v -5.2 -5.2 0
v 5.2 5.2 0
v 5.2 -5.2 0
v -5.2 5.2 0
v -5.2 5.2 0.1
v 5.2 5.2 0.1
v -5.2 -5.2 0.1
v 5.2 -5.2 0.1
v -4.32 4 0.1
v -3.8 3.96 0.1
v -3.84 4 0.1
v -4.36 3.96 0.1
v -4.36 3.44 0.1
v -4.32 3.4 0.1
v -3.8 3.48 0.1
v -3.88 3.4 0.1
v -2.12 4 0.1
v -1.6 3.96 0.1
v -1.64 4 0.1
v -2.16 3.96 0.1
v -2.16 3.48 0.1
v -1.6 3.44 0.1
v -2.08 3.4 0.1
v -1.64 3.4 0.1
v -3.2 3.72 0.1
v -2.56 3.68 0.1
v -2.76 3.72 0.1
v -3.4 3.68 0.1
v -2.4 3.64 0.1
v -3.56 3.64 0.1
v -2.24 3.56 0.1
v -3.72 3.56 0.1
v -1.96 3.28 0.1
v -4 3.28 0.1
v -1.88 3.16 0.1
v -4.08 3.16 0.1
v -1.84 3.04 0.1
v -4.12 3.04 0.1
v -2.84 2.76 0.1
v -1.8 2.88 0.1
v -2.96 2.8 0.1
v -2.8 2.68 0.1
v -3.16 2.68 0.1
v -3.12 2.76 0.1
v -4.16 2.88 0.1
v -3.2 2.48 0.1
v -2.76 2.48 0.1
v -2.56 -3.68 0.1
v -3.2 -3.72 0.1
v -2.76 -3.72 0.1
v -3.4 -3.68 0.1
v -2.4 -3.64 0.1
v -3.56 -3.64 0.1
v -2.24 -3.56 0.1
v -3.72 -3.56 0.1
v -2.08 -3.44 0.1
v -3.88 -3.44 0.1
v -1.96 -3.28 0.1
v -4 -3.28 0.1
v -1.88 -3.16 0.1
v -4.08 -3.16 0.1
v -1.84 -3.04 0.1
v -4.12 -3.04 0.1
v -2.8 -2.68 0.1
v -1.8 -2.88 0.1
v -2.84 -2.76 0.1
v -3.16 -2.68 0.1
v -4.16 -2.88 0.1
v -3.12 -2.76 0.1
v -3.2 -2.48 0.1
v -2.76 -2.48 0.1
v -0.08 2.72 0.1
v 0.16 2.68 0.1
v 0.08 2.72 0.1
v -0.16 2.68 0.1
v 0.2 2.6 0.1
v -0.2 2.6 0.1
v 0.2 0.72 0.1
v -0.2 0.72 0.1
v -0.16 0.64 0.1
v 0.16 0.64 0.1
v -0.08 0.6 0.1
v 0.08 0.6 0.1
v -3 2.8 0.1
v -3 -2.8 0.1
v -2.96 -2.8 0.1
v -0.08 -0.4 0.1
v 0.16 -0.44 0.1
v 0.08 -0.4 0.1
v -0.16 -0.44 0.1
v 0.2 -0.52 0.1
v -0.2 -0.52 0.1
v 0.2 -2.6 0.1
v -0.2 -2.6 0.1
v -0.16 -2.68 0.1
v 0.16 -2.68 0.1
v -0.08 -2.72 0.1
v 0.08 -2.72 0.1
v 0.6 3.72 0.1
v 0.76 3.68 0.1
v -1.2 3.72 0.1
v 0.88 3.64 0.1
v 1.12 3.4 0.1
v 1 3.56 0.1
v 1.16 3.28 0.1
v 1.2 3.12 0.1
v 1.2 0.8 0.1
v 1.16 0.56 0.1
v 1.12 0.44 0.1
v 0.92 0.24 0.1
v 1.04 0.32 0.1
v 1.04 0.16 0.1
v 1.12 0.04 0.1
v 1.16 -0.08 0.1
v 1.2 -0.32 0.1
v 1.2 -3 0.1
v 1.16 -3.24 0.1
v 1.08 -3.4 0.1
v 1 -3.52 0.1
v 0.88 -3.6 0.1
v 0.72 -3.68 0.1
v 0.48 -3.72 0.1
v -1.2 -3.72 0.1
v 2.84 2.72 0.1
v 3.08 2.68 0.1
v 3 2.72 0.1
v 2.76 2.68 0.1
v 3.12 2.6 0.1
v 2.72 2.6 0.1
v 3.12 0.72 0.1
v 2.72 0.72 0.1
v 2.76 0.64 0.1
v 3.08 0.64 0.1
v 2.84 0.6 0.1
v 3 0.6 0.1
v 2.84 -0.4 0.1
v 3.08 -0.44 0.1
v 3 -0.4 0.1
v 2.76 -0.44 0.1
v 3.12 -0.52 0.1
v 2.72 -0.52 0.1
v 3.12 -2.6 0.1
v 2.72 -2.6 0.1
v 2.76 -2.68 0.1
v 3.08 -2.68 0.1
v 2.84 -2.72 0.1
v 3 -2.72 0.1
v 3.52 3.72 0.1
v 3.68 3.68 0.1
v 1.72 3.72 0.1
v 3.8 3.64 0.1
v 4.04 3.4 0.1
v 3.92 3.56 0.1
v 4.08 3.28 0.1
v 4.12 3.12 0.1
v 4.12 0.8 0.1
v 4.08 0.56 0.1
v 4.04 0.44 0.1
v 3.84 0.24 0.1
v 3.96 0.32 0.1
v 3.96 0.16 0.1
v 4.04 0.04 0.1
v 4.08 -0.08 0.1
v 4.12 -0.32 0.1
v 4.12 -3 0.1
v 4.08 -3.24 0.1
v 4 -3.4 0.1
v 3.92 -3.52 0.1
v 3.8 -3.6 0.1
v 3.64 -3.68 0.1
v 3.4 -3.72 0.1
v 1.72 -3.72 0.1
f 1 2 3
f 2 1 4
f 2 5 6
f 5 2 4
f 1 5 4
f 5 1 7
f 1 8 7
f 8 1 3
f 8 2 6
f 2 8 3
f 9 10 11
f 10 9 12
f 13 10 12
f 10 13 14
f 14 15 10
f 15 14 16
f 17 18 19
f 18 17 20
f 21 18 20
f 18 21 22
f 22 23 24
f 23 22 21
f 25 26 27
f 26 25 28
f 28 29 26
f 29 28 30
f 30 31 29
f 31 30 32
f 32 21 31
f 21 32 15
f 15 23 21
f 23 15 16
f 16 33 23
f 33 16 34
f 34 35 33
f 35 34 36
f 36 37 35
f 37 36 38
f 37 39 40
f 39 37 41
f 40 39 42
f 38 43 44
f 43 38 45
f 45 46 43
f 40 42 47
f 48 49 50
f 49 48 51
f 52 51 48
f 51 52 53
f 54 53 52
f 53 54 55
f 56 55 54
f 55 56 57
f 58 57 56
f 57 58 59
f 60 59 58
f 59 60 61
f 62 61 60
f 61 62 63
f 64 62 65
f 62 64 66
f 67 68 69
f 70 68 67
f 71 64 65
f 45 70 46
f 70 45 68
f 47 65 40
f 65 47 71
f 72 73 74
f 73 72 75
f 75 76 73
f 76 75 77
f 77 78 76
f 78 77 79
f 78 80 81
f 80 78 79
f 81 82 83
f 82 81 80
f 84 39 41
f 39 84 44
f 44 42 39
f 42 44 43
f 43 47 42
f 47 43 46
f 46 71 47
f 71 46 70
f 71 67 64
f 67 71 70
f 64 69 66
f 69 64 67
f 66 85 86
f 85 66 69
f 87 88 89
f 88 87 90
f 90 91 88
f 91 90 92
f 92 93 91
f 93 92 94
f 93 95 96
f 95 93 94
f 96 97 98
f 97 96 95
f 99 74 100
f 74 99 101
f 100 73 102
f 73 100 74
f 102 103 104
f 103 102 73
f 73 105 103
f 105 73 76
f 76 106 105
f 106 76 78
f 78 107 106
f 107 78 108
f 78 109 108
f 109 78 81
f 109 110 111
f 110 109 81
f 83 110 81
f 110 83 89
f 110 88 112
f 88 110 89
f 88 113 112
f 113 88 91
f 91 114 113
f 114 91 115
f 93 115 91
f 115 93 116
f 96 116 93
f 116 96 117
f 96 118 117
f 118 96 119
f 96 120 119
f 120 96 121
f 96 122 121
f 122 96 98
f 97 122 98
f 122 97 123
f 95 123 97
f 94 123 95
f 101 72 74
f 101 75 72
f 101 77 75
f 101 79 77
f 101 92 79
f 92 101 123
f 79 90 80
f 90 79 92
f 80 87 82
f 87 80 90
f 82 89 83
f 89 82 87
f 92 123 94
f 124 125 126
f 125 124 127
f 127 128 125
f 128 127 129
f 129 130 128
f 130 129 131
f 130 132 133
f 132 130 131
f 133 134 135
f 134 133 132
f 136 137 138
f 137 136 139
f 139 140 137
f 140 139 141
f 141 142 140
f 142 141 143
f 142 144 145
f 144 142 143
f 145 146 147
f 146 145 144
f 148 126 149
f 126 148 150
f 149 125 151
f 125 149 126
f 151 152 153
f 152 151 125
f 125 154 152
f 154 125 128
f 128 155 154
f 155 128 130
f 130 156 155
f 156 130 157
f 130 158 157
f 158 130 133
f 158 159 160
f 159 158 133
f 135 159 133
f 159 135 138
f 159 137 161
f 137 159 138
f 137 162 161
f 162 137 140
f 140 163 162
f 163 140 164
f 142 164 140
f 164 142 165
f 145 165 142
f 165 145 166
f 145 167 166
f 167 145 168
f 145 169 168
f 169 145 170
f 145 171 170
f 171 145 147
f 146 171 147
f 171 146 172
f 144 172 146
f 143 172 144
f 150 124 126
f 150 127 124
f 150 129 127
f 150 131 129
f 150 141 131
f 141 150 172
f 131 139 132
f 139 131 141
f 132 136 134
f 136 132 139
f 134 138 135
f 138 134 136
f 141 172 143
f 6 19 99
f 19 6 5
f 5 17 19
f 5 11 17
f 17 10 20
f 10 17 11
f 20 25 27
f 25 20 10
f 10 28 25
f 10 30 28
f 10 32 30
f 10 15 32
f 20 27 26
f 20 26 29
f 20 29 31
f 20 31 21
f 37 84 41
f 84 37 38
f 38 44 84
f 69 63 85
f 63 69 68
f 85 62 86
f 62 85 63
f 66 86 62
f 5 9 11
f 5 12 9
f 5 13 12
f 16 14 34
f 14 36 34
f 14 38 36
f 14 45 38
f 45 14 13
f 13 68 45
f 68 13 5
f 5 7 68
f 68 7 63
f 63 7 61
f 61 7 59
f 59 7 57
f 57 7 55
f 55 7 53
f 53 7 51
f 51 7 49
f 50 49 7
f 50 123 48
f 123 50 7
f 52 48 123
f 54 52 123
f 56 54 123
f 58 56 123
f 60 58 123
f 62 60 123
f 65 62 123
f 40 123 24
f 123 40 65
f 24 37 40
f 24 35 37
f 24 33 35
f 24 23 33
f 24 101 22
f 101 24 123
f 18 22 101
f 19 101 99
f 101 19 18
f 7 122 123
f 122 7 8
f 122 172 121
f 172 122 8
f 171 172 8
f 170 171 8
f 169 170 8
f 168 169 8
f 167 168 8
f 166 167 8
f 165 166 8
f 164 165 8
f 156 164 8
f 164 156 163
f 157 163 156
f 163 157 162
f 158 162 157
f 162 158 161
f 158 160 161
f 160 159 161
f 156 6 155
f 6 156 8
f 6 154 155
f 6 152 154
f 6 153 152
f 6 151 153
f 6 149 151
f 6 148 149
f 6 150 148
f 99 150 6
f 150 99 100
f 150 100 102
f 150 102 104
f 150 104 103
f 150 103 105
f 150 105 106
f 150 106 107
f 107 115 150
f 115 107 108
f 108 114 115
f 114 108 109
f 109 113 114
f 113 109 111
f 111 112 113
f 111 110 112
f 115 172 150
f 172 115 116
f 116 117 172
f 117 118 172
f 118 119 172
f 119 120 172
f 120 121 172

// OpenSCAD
// file: ../p/box5-12.scad
use <../lib.scad>
function ldraw_lib__box5_12() = [
// 0 Box with 5 Faces without Any Edges
// 0 Name: box5-12.dat
// 0 Author: Chris Dee [cwdee]
// 0 !LDRAW_ORG Primitive UPDATE 2009-02
// 0 !LICENSE Licensed under CC BY 4.0 : see CAreadme.txt
// 
// 0 BFC CERTIFY CCW
  [0,"BFC","CERTIFY"],
  [0,"BFC","CCW"],
// 
// 0 !HISTORY 2009-09-03 [PTadmin] Official Update 2009-02
// 
// 
// 4 16 1 1 1 1 1 -1 -1 1 -1 -1 1 1
  [4,16,1,1,1,1,1,-1,-1,1,-1,-1,1,1],
// 4 16 -1 0 1 1 0 1 1 1 1 -1 1 1
  [4,16,-1,0,1,1,0,1,1,1,1,-1,1,1],
// 4 16 -1 0 -1 -1 0 1 -1 1 1 -1 1 -1
  [4,16,-1,0,-1,-1,0,1,-1,1,1,-1,1,-1],
// 4 16 1 0 -1 -1 0 -1 -1 1 -1 1 1 -1
  [4,16,1,0,-1,-1,0,-1,-1,1,-1,1,1,-1],
// 4 16 1 0 1 1 0 -1 1 1 -1 1 1 1
  [4,16,1,0,1,1,0,-1,1,1,-1,1,1,1],
// 0
];
module ldraw_lib__box5_12(step=0, col=false, unit=2/5, alt=false, line=0.2, solid=!$preview)
    makepoly(ldraw_lib__box5_12(), step=step, col=col, unit=unit, alt=alt, line=line, solid=solid);
ldraw_lib__box5_12(line=0.2);
// main file
use <../lib.scad>
use <../p/box5-12.scad>
function ldraw_lib__004757d() = [
// 0 Sticker  1.3 x  1.3 with White Austrian Railways Logo
// 0 Name: 004757d.dat
// 0 Author: Takeshi Takahashi [RainbowDolphin]
// 0 !LDRAW_ORG Part UPDATE 2023-04
// 0 !LICENSE Licensed under CC BY 4.0 : see CAreadme.txt
// 
// 0 BFC CERTIFY CCW
  [0,"BFC","CERTIFY"],
  [0,"BFC","CCW"],
// 
// 0 !KEYWORDS Bricklink 164stk01, Brickowl 575181, Caboose, Passenger wagon
// 0 !KEYWORDS Rebrickable 4757stk, Set 164-1, Train
// 
// 0 !HISTORY 2020-01-07 [Plastikean] Original TEXMAP pattern for OMR
// 0 !HISTORY 2021-04-01 [RainbowDolphin] File preparation for LDraw Parts Tracker, vectorized the pattern
// 0 !HISTORY 2023-08-25 [OrionP] Official Update 2023-04
// 
// 
// 1 16 0 -0.25 0 13 0 0 0 0.25 0 0 0 13 box5-12.dat
  [1,16,0,-0.25,0,13,0,0,0,0.25,0,0,0,13, ldraw_lib__box5_12()],
// 4 15 -9.6 -0.25 10 -10.8 -0.25 10 -10.9 -0.25 9.9 -9.5 -0.25 9.9
  [4,15,-9.6,-0.25,10,-10.8,-0.25,10,-10.9,-0.25,9.9,-9.5,-0.25,9.9],
// 4 15 -9.5 -0.25 9.9 -10.9 -0.25 9.9 -10.9 -0.25 8.6 -10.8 -0.25 8.5
  [4,15,-9.5,-0.25,9.9,-10.9,-0.25,9.9,-10.9,-0.25,8.6,-10.8,-0.25,8.5],
// 4 15 -9.5 -0.25 9.9 -10.8 -0.25 8.5 -9.7 -0.25 8.5 -9.5 -0.25 8.7
  [4,15,-9.5,-0.25,9.9,-10.8,-0.25,8.5,-9.7,-0.25,8.5,-9.5,-0.25,8.7],
// 4 15 -4.1 -0.25 10 -5.3 -0.25 10 -5.4 -0.25 9.9 -4 -0.25 9.9
  [4,15,-4.1,-0.25,10,-5.3,-0.25,10,-5.4,-0.25,9.9,-4,-0.25,9.9],
// 4 15 -4 -0.25 9.9 -5.4 -0.25 9.9 -5.4 -0.25 8.7 -4 -0.25 8.6
  [4,15,-4,-0.25,9.9,-5.4,-0.25,9.9,-5.4,-0.25,8.7,-4,-0.25,8.6],
// 4 15 -4.1 -0.25 8.5 -4 -0.25 8.6 -5.4 -0.25 8.7 -5.2 -0.25 8.5
  [4,15,-4.1,-0.25,8.5,-4,-0.25,8.6,-5.4,-0.25,8.7,-5.2,-0.25,8.5],
// 4 15 -6.9 -0.25 9.3 -8 -0.25 9.3 -8.5 -0.25 9.2 -6.4 -0.25 9.2
  [4,15,-6.9,-0.25,9.3,-8,-0.25,9.3,-8.5,-0.25,9.2,-6.4,-0.25,9.2],
// 4 15 -6.4 -0.25 9.2 -8.5 -0.25 9.2 -8.9 -0.25 9.1 -6 -0.25 9.1
  [4,15,-6.4,-0.25,9.2,-8.5,-0.25,9.2,-8.9,-0.25,9.1,-6,-0.25,9.1],
// 4 15 -6 -0.25 9.1 -8.9 -0.25 9.1 -9.3 -0.25 8.9 -5.6 -0.25 8.9
  [4,15,-6,-0.25,9.1,-8.9,-0.25,9.1,-9.3,-0.25,8.9,-5.6,-0.25,8.9],
// 4 15 -5.6 -0.25 8.9 -9.3 -0.25 8.9 -9.5 -0.25 8.7 -5.4 -0.25 8.7
  [4,15,-5.6,-0.25,8.9,-9.3,-0.25,8.9,-9.5,-0.25,8.7,-5.4,-0.25,8.7],
// 4 15 -5.4 -0.25 8.7 -9.5 -0.25 8.7 -9.7 -0.25 8.5 -5.2 -0.25 8.5
  [4,15,-5.4,-0.25,8.7,-9.5,-0.25,8.7,-9.7,-0.25,8.5,-5.2,-0.25,8.5],
// 4 15 -5.2 -0.25 8.5 -9.7 -0.25 8.5 -10 -0.25 8.2 -4.9 -0.25 8.2
  [4,15,-5.2,-0.25,8.5,-9.7,-0.25,8.5,-10,-0.25,8.2,-4.9,-0.25,8.2],
// 4 15 -4.9 -0.25 8.2 -10 -0.25 8.2 -10.2 -0.25 7.9 -4.7 -0.25 7.9
  [4,15,-4.9,-0.25,8.2,-10,-0.25,8.2,-10.2,-0.25,7.9,-4.7,-0.25,7.9],
// 4 15 -4.7 -0.25 7.9 -10.2 -0.25 7.9 -10.3 -0.25 7.6 -4.6 -0.25 7.6
  [4,15,-4.7,-0.25,7.9,-10.2,-0.25,7.9,-10.3,-0.25,7.6,-4.6,-0.25,7.6],
// 4 15 -7.4 -0.25 7 -7.1 -0.25 6.9 -4.5 -0.25 7.2 -4.6 -0.25 7.6
  [4,15,-7.4,-0.25,7,-7.1,-0.25,6.9,-4.5,-0.25,7.2,-4.6,-0.25,7.6],
// 3 15 -4.5 -0.25 7.2 -7.1 -0.25 6.9 -7 -0.25 6.7
  [3,15,-4.5,-0.25,7.2,-7.1,-0.25,6.9,-7,-0.25,6.7],
// 4 15 -10.4 -0.25 7.2 -7.9 -0.25 6.7 -7.8 -0.25 6.9 -10.3 -0.25 7.6
  [4,15,-10.4,-0.25,7.2,-7.9,-0.25,6.7,-7.8,-0.25,6.9,-10.3,-0.25,7.6],
// 3 15 -10.4 -0.25 7.2 -8 -0.25 6.2 -7.9 -0.25 6.7
  [3,15,-10.4,-0.25,7.2,-8,-0.25,6.2,-7.9,-0.25,6.7],
// 3 15 -4.5 -0.25 7.2 -7 -0.25 6.7 -6.9 -0.25 6.2
  [3,15,-4.5,-0.25,7.2,-7,-0.25,6.7,-6.9,-0.25,6.2],
// 4 15 -8.5 -0.25 -9.2 -8 -0.25 -9.3 -6.9 -0.25 -9.3 -6.4 -0.25 -9.2
  [4,15,-8.5,-0.25,-9.2,-8,-0.25,-9.3,-6.9,-0.25,-9.3,-6.4,-0.25,-9.2],
// 4 15 -8.9 -0.25 -9.1 -8.5 -0.25 -9.2 -6.4 -0.25 -9.2 -6 -0.25 -9.1
  [4,15,-8.9,-0.25,-9.1,-8.5,-0.25,-9.2,-6.4,-0.25,-9.2,-6,-0.25,-9.1],
// 4 15 -9.3 -0.25 -8.9 -8.9 -0.25 -9.1 -6 -0.25 -9.1 -5.6 -0.25 -8.9
  [4,15,-9.3,-0.25,-8.9,-8.9,-0.25,-9.1,-6,-0.25,-9.1,-5.6,-0.25,-8.9],
// 4 15 -9.7 -0.25 -8.6 -9.3 -0.25 -8.9 -5.6 -0.25 -8.9 -5.2 -0.25 -8.6
  [4,15,-9.7,-0.25,-8.6,-9.3,-0.25,-8.9,-5.6,-0.25,-8.9,-5.2,-0.25,-8.6],
// 4 15 -10 -0.25 -8.2 -9.7 -0.25 -8.6 -5.2 -0.25 -8.6 -4.9 -0.25 -8.2
  [4,15,-10,-0.25,-8.2,-9.7,-0.25,-8.6,-5.2,-0.25,-8.6,-4.9,-0.25,-8.2],
// 4 15 -10.2 -0.25 -7.9 -10 -0.25 -8.2 -4.9 -0.25 -8.2 -4.7 -0.25 -7.9
  [4,15,-10.2,-0.25,-7.9,-10,-0.25,-8.2,-4.9,-0.25,-8.2,-4.7,-0.25,-7.9],
// 4 15 -10.3 -0.25 -7.6 -10.2 -0.25 -7.9 -4.7 -0.25 -7.9 -4.6 -0.25 -7.6
  [4,15,-10.3,-0.25,-7.6,-10.2,-0.25,-7.9,-4.7,-0.25,-7.9,-4.6,-0.25,-7.6],
// 4 15 -4.5 -0.25 -7.2 -7 -0.25 -6.7 -7.1 -0.25 -6.9 -4.6 -0.25 -7.6
  [4,15,-4.5,-0.25,-7.2,-7,-0.25,-6.7,-7.1,-0.25,-6.9,-4.6,-0.25,-7.6],
// 3 15 -7.9 -0.25 -6.7 -10.4 -0.25 -7.2 -7.8 -0.25 -6.9
  [3,15,-7.9,-0.25,-6.7,-10.4,-0.25,-7.2,-7.8,-0.25,-6.9],
// 3 15 -8 -0.25 -6.2 -10.4 -0.25 -7.2 -7.9 -0.25 -6.7
  [3,15,-8,-0.25,-6.2,-10.4,-0.25,-7.2,-7.9,-0.25,-6.7],
// 3 15 -6.9 -0.25 -6.2 -7 -0.25 -6.7 -4.5 -0.25 -7.2
  [3,15,-6.9,-0.25,-6.2,-7,-0.25,-6.7,-4.5,-0.25,-7.2],
// 4 15 -10.4 -0.25 -7.2 -8 -0.25 -6.2 -8 -0.25 6.2 -10.4 -0.25 7.2
  [4,15,-10.4,-0.25,-7.2,-8,-0.25,-6.2,-8,-0.25,6.2,-10.4,-0.25,7.2],
// 4 15 -6.9 -0.25 6.2 -6.9 -0.25 -6.2 -4.5 -0.25 -7.2 -4.5 -0.25 7.2
  [4,15,-6.9,-0.25,6.2,-6.9,-0.25,-6.2,-4.5,-0.25,-7.2,-4.5,-0.25,7.2],
// 4 4 0.2 -0.25 6.8 -0.2 -0.25 6.8 -0.4 -0.25 6.7 0.4 -0.25 6.7
  [4,4,0.2,-0.25,6.8,-0.2,-0.25,6.8,-0.4,-0.25,6.7,0.4,-0.25,6.7],
// 4 4 0.4 -0.25 6.7 -0.4 -0.25 6.7 -0.5 -0.25 6.5 0.5 -0.25 6.5
  [4,4,0.4,-0.25,6.7,-0.4,-0.25,6.7,-0.5,-0.25,6.5,0.5,-0.25,6.5],
// 4 4 0.5 -0.25 6.5 -0.5 -0.25 6.5 -0.5 -0.25 1.8 0.5 -0.25 1.8
  [4,4,0.5,-0.25,6.5,-0.5,-0.25,6.5,-0.5,-0.25,1.8,0.5,-0.25,1.8],
// 4 4 0.5 -0.25 1.8 -0.5 -0.25 1.8 -0.4 -0.25 1.6 0.4 -0.25 1.6
  [4,4,0.5,-0.25,1.8,-0.5,-0.25,1.8,-0.4,-0.25,1.6,0.4,-0.25,1.6],
// 4 4 0.4 -0.25 1.6 -0.4 -0.25 1.6 -0.2 -0.25 1.5 0.2 -0.25 1.5
  [4,4,0.4,-0.25,1.6,-0.4,-0.25,1.6,-0.2,-0.25,1.5,0.2,-0.25,1.5],
// 4 4 -7.4 -0.25 7 -7.5 -0.25 7 -7.8 -0.25 6.9 -7.1 -0.25 6.9
  [4,4,-7.4,-0.25,7,-7.5,-0.25,7,-7.8,-0.25,6.9,-7.1,-0.25,6.9],
// 4 4 -7.1 -0.25 6.9 -7.8 -0.25 6.9 -7.9 -0.25 6.7 -7 -0.25 6.7
  [4,4,-7.1,-0.25,6.9,-7.8,-0.25,6.9,-7.9,-0.25,6.7,-7,-0.25,6.7],
// 4 4 -7 -0.25 6.7 -7.9 -0.25 6.7 -8 -0.25 6.2 -6.9 -0.25 6.2
  [4,4,-7,-0.25,6.7,-7.9,-0.25,6.7,-8,-0.25,6.2,-6.9,-0.25,6.2],
// 4 4 -6.9 -0.25 6.2 -8 -0.25 6.2 -8 -0.25 -6.2 -6.9 -0.25 -6.2
  [4,4,-6.9,-0.25,6.2,-8,-0.25,6.2,-8,-0.25,-6.2,-6.9,-0.25,-6.2],
// 4 4 -6.9 -0.25 -6.2 -8 -0.25 -6.2 -7.9 -0.25 -6.7 -7 -0.25 -6.7
  [4,4,-6.9,-0.25,-6.2,-8,-0.25,-6.2,-7.9,-0.25,-6.7,-7,-0.25,-6.7],
// 4 4 -7 -0.25 -6.7 -7.9 -0.25 -6.7 -7.8 -0.25 -6.9 -7.1 -0.25 -6.9
  [4,4,-7,-0.25,-6.7,-7.9,-0.25,-6.7,-7.8,-0.25,-6.9,-7.1,-0.25,-6.9],
// 4 4 -7.1 -0.25 -6.9 -7.8 -0.25 -6.9 -7.5 -0.25 -7 -7.4 -0.25 -7
  [4,4,-7.1,-0.25,-6.9,-7.8,-0.25,-6.9,-7.5,-0.25,-7,-7.4,-0.25,-7],
// 4 4 0.2 -0.25 -1 -0.2 -0.25 -1 -0.4 -0.25 -1.1 0.4 -0.25 -1.1
  [4,4,0.2,-0.25,-1,-0.2,-0.25,-1,-0.4,-0.25,-1.1,0.4,-0.25,-1.1],
// 4 4 0.4 -0.25 -1.1 -0.4 -0.25 -1.1 -0.5 -0.25 -1.3 0.5 -0.25 -1.3
  [4,4,0.4,-0.25,-1.1,-0.4,-0.25,-1.1,-0.5,-0.25,-1.3,0.5,-0.25,-1.3],
// 4 4 0.5 -0.25 -1.3 -0.5 -0.25 -1.3 -0.5 -0.25 -6.5 0.5 -0.25 -6.5
  [4,4,0.5,-0.25,-1.3,-0.5,-0.25,-1.3,-0.5,-0.25,-6.5,0.5,-0.25,-6.5],
// 4 4 0.5 -0.25 -6.5 -0.5 -0.25 -6.5 -0.4 -0.25 -6.7 0.4 -0.25 -6.7
  [4,4,0.5,-0.25,-6.5,-0.5,-0.25,-6.5,-0.4,-0.25,-6.7,0.4,-0.25,-6.7],
// 4 4 0.4 -0.25 -6.7 -0.4 -0.25 -6.7 -0.2 -0.25 -6.8 0.2 -0.25 -6.8
  [4,4,0.4,-0.25,-6.7,-0.4,-0.25,-6.7,-0.2,-0.25,-6.8,0.2,-0.25,-6.8],
// 4 15 1.5 -0.25 9.3 -3 -0.25 9.3 0.2 -0.25 6.8 1.9 -0.25 9.2
  [4,15,1.5,-0.25,9.3,-3,-0.25,9.3,0.2,-0.25,6.8,1.9,-0.25,9.2],
// 4 15 2.2 -0.25 9.1 1.9 -0.25 9.2 0.2 -0.25 6.8 0.4 -0.25 6.7
  [4,15,2.2,-0.25,9.1,1.9,-0.25,9.2,0.2,-0.25,6.8,0.4,-0.25,6.7],
// 4 15 2.5 -0.25 8.9 2.2 -0.25 9.1 0.4 -0.25 6.7 2.8 -0.25 8.5
  [4,15,2.5,-0.25,8.9,2.2,-0.25,9.1,0.4,-0.25,6.7,2.8,-0.25,8.5],
// 4 15 2.8 -0.25 8.5 0.4 -0.25 6.7 0.5 -0.25 6.5 2.9 -0.25 8.2
  [4,15,2.8,-0.25,8.5,0.4,-0.25,6.7,0.5,-0.25,6.5,2.9,-0.25,8.2],
// 4 15 3 -0.25 7.8 2.9 -0.25 8.2 0.5 -0.25 6.5 0.5 -0.25 1.8
  [4,15,3,-0.25,7.8,2.9,-0.25,8.2,0.5,-0.25,6.5,0.5,-0.25,1.8],
// 4 15 3 -0.25 2 3 -0.25 7.8 0.5 -0.25 1.8 2.9 -0.25 1.4
  [4,15,3,-0.25,2,3,-0.25,7.8,0.5,-0.25,1.8,2.9,-0.25,1.4],
// 4 15 2.9 -0.25 1.4 0.5 -0.25 1.8 0.4 -0.25 1.6 2.8 -0.25 1.1
  [4,15,2.9,-0.25,1.4,0.5,-0.25,1.8,0.4,-0.25,1.6,2.8,-0.25,1.1],
// 4 15 2.6 -0.25 0.8 2.8 -0.25 1.1 0.4 -0.25 1.6 2.3 -0.25 0.6
  [4,15,2.6,-0.25,0.8,2.8,-0.25,1.1,0.4,-0.25,1.6,2.3,-0.25,0.6],
// 4 15 2.3 -0.25 0.6 0.4 -0.25 1.6 0.2 -0.25 1.5 0.2 -0.25 -1
  [4,15,2.3,-0.25,0.6,0.4,-0.25,1.6,0.2,-0.25,1.5,0.2,-0.25,-1],
// 4 15 2.3 -0.25 0.6 0.2 -0.25 -1 0.4 -0.25 -1.1 2.6 -0.25 0.4
  [4,15,2.3,-0.25,0.6,0.2,-0.25,-1,0.4,-0.25,-1.1,2.6,-0.25,0.4],
// 4 15 2.8 -0.25 0.1 2.6 -0.25 0.4 0.4 -0.25 -1.1 0.5 -0.25 -1.3
  [4,15,2.8,-0.25,0.1,2.6,-0.25,0.4,0.4,-0.25,-1.1,0.5,-0.25,-1.3],
// 4 15 2.9 -0.25 -0.2 2.8 -0.25 0.1 0.5 -0.25 -1.3 3 -0.25 -0.8
  [4,15,2.9,-0.25,-0.2,2.8,-0.25,0.1,0.5,-0.25,-1.3,3,-0.25,-0.8],
// 4 15 3 -0.25 -0.8 0.5 -0.25 -1.3 0.5 -0.25 -6.5 3 -0.25 -7.5
  [4,15,3,-0.25,-0.8,0.5,-0.25,-1.3,0.5,-0.25,-6.5,3,-0.25,-7.5],
// 4 15 3 -0.25 -7.5 0.5 -0.25 -6.5 0.4 -0.25 -6.7 2.9 -0.25 -8.1
  [4,15,3,-0.25,-7.5,0.5,-0.25,-6.5,0.4,-0.25,-6.7,2.9,-0.25,-8.1],
// 4 15 2.7 -0.25 -8.5 2.9 -0.25 -8.1 0.4 -0.25 -6.7 2.5 -0.25 -8.8
  [4,15,2.7,-0.25,-8.5,2.9,-0.25,-8.1,0.4,-0.25,-6.7,2.5,-0.25,-8.8],
// 4 15 2.2 -0.25 -9 2.5 -0.25 -8.8 0.4 -0.25 -6.7 1.8 -0.25 -9.2
  [4,15,2.2,-0.25,-9,2.5,-0.25,-8.8,0.4,-0.25,-6.7,1.8,-0.25,-9.2],
// 4 15 1.8 -0.25 -9.2 0.4 -0.25 -6.7 0.2 -0.25 -6.8 1.2 -0.25 -9.3
  [4,15,1.8,-0.25,-9.2,0.4,-0.25,-6.7,0.2,-0.25,-6.8,1.2,-0.25,-9.3],
// 4 15 1.2 -0.25 -9.3 0.2 -0.25 -6.8 -0.2 -0.25 -6.8 -3 -0.25 -9.3
  [4,15,1.2,-0.25,-9.3,0.2,-0.25,-6.8,-0.2,-0.25,-6.8,-3,-0.25,-9.3],
// 3 15 -0.4 -0.25 -6.7 -3 -0.25 -9.3 -0.2 -0.25 -6.8
  [3,15,-0.4,-0.25,-6.7,-3,-0.25,-9.3,-0.2,-0.25,-6.8],
// 3 15 -0.5 -0.25 -6.5 -3 -0.25 -9.3 -0.4 -0.25 -6.7
  [3,15,-0.5,-0.25,-6.5,-3,-0.25,-9.3,-0.4,-0.25,-6.7],
// 3 15 -3 -0.25 9.3 -0.2 -0.25 6.8 0.2 -0.25 6.8
  [3,15,-3,-0.25,9.3,-0.2,-0.25,6.8,0.2,-0.25,6.8],
// 3 15 -3 -0.25 9.3 -0.4 -0.25 6.7 -0.2 -0.25 6.8
  [3,15,-3,-0.25,9.3,-0.4,-0.25,6.7,-0.2,-0.25,6.8],
// 3 15 -3 -0.25 9.3 -0.5 -0.25 6.5 -0.4 -0.25 6.7
  [3,15,-3,-0.25,9.3,-0.5,-0.25,6.5,-0.4,-0.25,6.7],
// 3 15 -3 -0.25 9.3 -0.5 -0.25 1.8 -0.5 -0.25 6.5
  [3,15,-3,-0.25,9.3,-0.5,-0.25,1.8,-0.5,-0.25,6.5],
// 4 15 -0.5 -0.25 -1.3 -0.5 -0.25 1.8 -3 -0.25 9.3 -3 -0.25 -9.3
  [4,15,-0.5,-0.25,-1.3,-0.5,-0.25,1.8,-3,-0.25,9.3,-3,-0.25,-9.3],
// 4 15 -0.4 -0.25 1.6 -0.5 -0.25 1.8 -0.5 -0.25 -1.3 -0.4 -0.25 -1.1
  [4,15,-0.4,-0.25,1.6,-0.5,-0.25,1.8,-0.5,-0.25,-1.3,-0.4,-0.25,-1.1],
// 4 15 -0.2 -0.25 1.5 -0.4 -0.25 1.6 -0.4 -0.25 -1.1 -0.2 -0.25 -1
  [4,15,-0.2,-0.25,1.5,-0.4,-0.25,1.6,-0.4,-0.25,-1.1,-0.2,-0.25,-1],
// 4 15 0.2 -0.25 1.5 -0.2 -0.25 1.5 -0.2 -0.25 -1 0.2 -0.25 -1
  [4,15,0.2,-0.25,1.5,-0.2,-0.25,1.5,-0.2,-0.25,-1,0.2,-0.25,-1],
// 3 15 -0.5 -0.25 -1.3 -3 -0.25 -9.3 -0.5 -0.25 -6.5
  [3,15,-0.5,-0.25,-1.3,-3,-0.25,-9.3,-0.5,-0.25,-6.5],
// 4 4 7.5 -0.25 6.8 7.1 -0.25 6.8 6.9 -0.25 6.7 7.7 -0.25 6.7
  [4,4,7.5,-0.25,6.8,7.1,-0.25,6.8,6.9,-0.25,6.7,7.7,-0.25,6.7],
// 4 4 7.7 -0.25 6.7 6.9 -0.25 6.7 6.8 -0.25 6.5 7.8 -0.25 6.5
  [4,4,7.7,-0.25,6.7,6.9,-0.25,6.7,6.8,-0.25,6.5,7.8,-0.25,6.5],
// 4 4 7.8 -0.25 6.5 6.8 -0.25 6.5 6.8 -0.25 1.8 7.8 -0.25 1.8
  [4,4,7.8,-0.25,6.5,6.8,-0.25,6.5,6.8,-0.25,1.8,7.8,-0.25,1.8],
// 4 4 7.8 -0.25 1.8 6.8 -0.25 1.8 6.9 -0.25 1.6 7.7 -0.25 1.6
  [4,4,7.8,-0.25,1.8,6.8,-0.25,1.8,6.9,-0.25,1.6,7.7,-0.25,1.6],
// 4 4 7.7 -0.25 1.6 6.9 -0.25 1.6 7.1 -0.25 1.5 7.5 -0.25 1.5
  [4,4,7.7,-0.25,1.6,6.9,-0.25,1.6,7.1,-0.25,1.5,7.5,-0.25,1.5],
// 4 4 7.5 -0.25 -1 7.1 -0.25 -1 6.9 -0.25 -1.1 7.7 -0.25 -1.1
  [4,4,7.5,-0.25,-1,7.1,-0.25,-1,6.9,-0.25,-1.1,7.7,-0.25,-1.1],
// 4 4 7.7 -0.25 -1.1 6.9 -0.25 -1.1 6.8 -0.25 -1.3 7.8 -0.25 -1.3
  [4,4,7.7,-0.25,-1.1,6.9,-0.25,-1.1,6.8,-0.25,-1.3,7.8,-0.25,-1.3],
// 4 4 7.8 -0.25 -1.3 6.8 -0.25 -1.3 6.8 -0.25 -6.5 7.8 -0.25 -6.5
  [4,4,7.8,-0.25,-1.3,6.8,-0.25,-1.3,6.8,-0.25,-6.5,7.8,-0.25,-6.5],
// 4 4 7.8 -0.25 -6.5 6.8 -0.25 -6.5 6.9 -0.25 -6.7 7.7 -0.25 -6.7
  [4,4,7.8,-0.25,-6.5,6.8,-0.25,-6.5,6.9,-0.25,-6.7,7.7,-0.25,-6.7],
// 4 4 7.7 -0.25 -6.7 6.9 -0.25 -6.7 7.1 -0.25 -6.8 7.5 -0.25 -6.8
  [4,4,7.7,-0.25,-6.7,6.9,-0.25,-6.7,7.1,-0.25,-6.8,7.5,-0.25,-6.8],
// 4 15 8.8 -0.25 9.3 4.3 -0.25 9.3 7.5 -0.25 6.8 9.2 -0.25 9.2
  [4,15,8.8,-0.25,9.3,4.3,-0.25,9.3,7.5,-0.25,6.8,9.2,-0.25,9.2],
// 4 15 9.5 -0.25 9.1 9.2 -0.25 9.2 7.5 -0.25 6.8 7.7 -0.25 6.7
  [4,15,9.5,-0.25,9.1,9.2,-0.25,9.2,7.5,-0.25,6.8,7.7,-0.25,6.7],
// 4 15 9.8 -0.25 8.9 9.5 -0.25 9.1 7.7 -0.25 6.7 10.1 -0.25 8.5
  [4,15,9.8,-0.25,8.9,9.5,-0.25,9.1,7.7,-0.25,6.7,10.1,-0.25,8.5],
// 4 15 10.1 -0.25 8.5 7.7 -0.25 6.7 7.8 -0.25 6.5 10.2 -0.25 8.2
  [4,15,10.1,-0.25,8.5,7.7,-0.25,6.7,7.8,-0.25,6.5,10.2,-0.25,8.2],
// 4 15 10.3 -0.25 7.8 10.2 -0.25 8.2 7.8 -0.25 6.5 7.8 -0.25 1.8
  [4,15,10.3,-0.25,7.8,10.2,-0.25,8.2,7.8,-0.25,6.5,7.8,-0.25,1.8],
// 4 15 10.3 -0.25 2 10.3 -0.25 7.8 7.8 -0.25 1.8 10.2 -0.25 1.4
  [4,15,10.3,-0.25,2,10.3,-0.25,7.8,7.8,-0.25,1.8,10.2,-0.25,1.4],
// 4 15 10.2 -0.25 1.4 7.8 -0.25 1.8 7.7 -0.25 1.6 10.1 -0.25 1.1
  [4,15,10.2,-0.25,1.4,7.8,-0.25,1.8,7.7,-0.25,1.6,10.1,-0.25,1.1],
// 4 15 9.9 -0.25 0.8 10.1 -0.25 1.1 7.7 -0.25 1.6 9.6 -0.25 0.6
  [4,15,9.9,-0.25,0.8,10.1,-0.25,1.1,7.7,-0.25,1.6,9.6,-0.25,0.6],
// 4 15 9.6 -0.25 0.6 7.7 -0.25 1.6 7.5 -0.25 1.5 7.5 -0.25 -1
  [4,15,9.6,-0.25,0.6,7.7,-0.25,1.6,7.5,-0.25,1.5,7.5,-0.25,-1],
// 4 15 9.6 -0.25 0.6 7.5 -0.25 -1 7.7 -0.25 -1.1 9.9 -0.25 0.4
  [4,15,9.6,-0.25,0.6,7.5,-0.25,-1,7.7,-0.25,-1.1,9.9,-0.25,0.4],
// 4 15 10.1 -0.25 0.1 9.9 -0.25 0.4 7.7 -0.25 -1.1 7.8 -0.25 -1.3
  [4,15,10.1,-0.25,0.1,9.9,-0.25,0.4,7.7,-0.25,-1.1,7.8,-0.25,-1.3],
// 4 15 10.2 -0.25 -0.2 10.1 -0.25 0.1 7.8 -0.25 -1.3 10.3 -0.25 -0.8
  [4,15,10.2,-0.25,-0.2,10.1,-0.25,0.1,7.8,-0.25,-1.3,10.3,-0.25,-0.8],
// 4 15 10.3 -0.25 -0.8 7.8 -0.25 -1.3 7.8 -0.25 -6.5 10.3 -0.25 -7.5
  [4,15,10.3,-0.25,-0.8,7.8,-0.25,-1.3,7.8,-0.25,-6.5,10.3,-0.25,-7.5],
// 4 15 10.3 -0.25 -7.5 7.8 -0.25 -6.5 7.7 -0.25 -6.7 10.2 -0.25 -8.1
  [4,15,10.3,-0.25,-7.5,7.8,-0.25,-6.5,7.7,-0.25,-6.7,10.2,-0.25,-8.1],
// 4 15 10 -0.25 -8.5 10.2 -0.25 -8.1 7.7 -0.25 -6.7 9.8 -0.25 -8.8
  [4,15,10,-0.25,-8.5,10.2,-0.25,-8.1,7.7,-0.25,-6.7,9.8,-0.25,-8.8],
// 4 15 9.5 -0.25 -9 9.8 -0.25 -8.8 7.7 -0.25 -6.7 9.1 -0.25 -9.2
  [4,15,9.5,-0.25,-9,9.8,-0.25,-8.8,7.7,-0.25,-6.7,9.1,-0.25,-9.2],
// 4 15 9.1 -0.25 -9.2 7.7 -0.25 -6.7 7.5 -0.25 -6.8 8.5 -0.25 -9.3
  [4,15,9.1,-0.25,-9.2,7.7,-0.25,-6.7,7.5,-0.25,-6.8,8.5,-0.25,-9.3],
// 4 15 8.5 -0.25 -9.3 7.5 -0.25 -6.8 7.1 -0.25 -6.8 4.3 -0.25 -9.3
  [4,15,8.5,-0.25,-9.3,7.5,-0.25,-6.8,7.1,-0.25,-6.8,4.3,-0.25,-9.3],
// 3 15 6.9 -0.25 -6.7 4.3 -0.25 -9.3 7.1 -0.25 -6.8
  [3,15,6.9,-0.25,-6.7,4.3,-0.25,-9.3,7.1,-0.25,-6.8],
// 3 15 6.8 -0.25 -6.5 4.3 -0.25 -9.3 6.9 -0.25 -6.7
  [3,15,6.8,-0.25,-6.5,4.3,-0.25,-9.3,6.9,-0.25,-6.7],
// 3 15 4.3 -0.25 9.3 7.1 -0.25 6.8 7.5 -0.25 6.8
  [3,15,4.3,-0.25,9.3,7.1,-0.25,6.8,7.5,-0.25,6.8],
// 3 15 4.3 -0.25 9.3 6.9 -0.25 6.7 7.1 -0.25 6.8
  [3,15,4.3,-0.25,9.3,6.9,-0.25,6.7,7.1,-0.25,6.8],
// 3 15 4.3 -0.25 9.3 6.8 -0.25 6.5 6.9 -0.25 6.7
  [3,15,4.3,-0.25,9.3,6.8,-0.25,6.5,6.9,-0.25,6.7],
// 3 15 4.3 -0.25 9.3 6.8 -0.25 1.8 6.8 -0.25 6.5
  [3,15,4.3,-0.25,9.3,6.8,-0.25,1.8,6.8,-0.25,6.5],
// 4 15 6.8 -0.25 -1.3 6.8 -0.25 1.8 4.3 -0.25 9.3 4.3 -0.25 -9.3
  [4,15,6.8,-0.25,-1.3,6.8,-0.25,1.8,4.3,-0.25,9.3,4.3,-0.25,-9.3],
// 4 15 6.9 -0.25 1.6 6.8 -0.25 1.8 6.8 -0.25 -1.3 6.9 -0.25 -1.1
  [4,15,6.9,-0.25,1.6,6.8,-0.25,1.8,6.8,-0.25,-1.3,6.9,-0.25,-1.1],
// 4 15 7.1 -0.25 1.5 6.9 -0.25 1.6 6.9 -0.25 -1.1 7.1 -0.25 -1
  [4,15,7.1,-0.25,1.5,6.9,-0.25,1.6,6.9,-0.25,-1.1,7.1,-0.25,-1],
// 4 15 7.5 -0.25 1.5 7.1 -0.25 1.5 7.1 -0.25 -1 7.5 -0.25 -1
  [4,15,7.5,-0.25,1.5,7.1,-0.25,1.5,7.1,-0.25,-1,7.5,-0.25,-1],
// 3 15 6.8 -0.25 -1.3 4.3 -0.25 -9.3 6.8 -0.25 -6.5
  [3,15,6.8,-0.25,-1.3,4.3,-0.25,-9.3,6.8,-0.25,-6.5],
// 4 4 1.5 -0.25 9.3 13 -0.25 13 -13 -0.25 13 -4.1 -0.25 10
  [4,4,1.5,-0.25,9.3,13,-0.25,13,-13,-0.25,13,-4.1,-0.25,10],
// 3 4 -13 -0.25 13 -5.3 -0.25 10 -4.1 -0.25 10
  [3,4,-13,-0.25,13,-5.3,-0.25,10,-4.1,-0.25,10],
// 3 4 -13 -0.25 13 -9.6 -0.25 10 -5.3 -0.25 10
  [3,4,-13,-0.25,13,-9.6,-0.25,10,-5.3,-0.25,10],
// 4 4 -5.3 -0.25 10 -9.6 -0.25 10 -9.5 -0.25 9.9 -5.4 -0.25 9.9
  [4,4,-5.3,-0.25,10,-9.6,-0.25,10,-9.5,-0.25,9.9,-5.4,-0.25,9.9],
// 4 4 -6.9 -0.25 9.3 -5.4 -0.25 9.9 -9.5 -0.25 9.9 -8 -0.25 9.3
  [4,4,-6.9,-0.25,9.3,-5.4,-0.25,9.9,-9.5,-0.25,9.9,-8,-0.25,9.3],
// 3 4 -9.5 -0.25 9.9 -8.5 -0.25 9.2 -8 -0.25 9.3
  [3,4,-9.5,-0.25,9.9,-8.5,-0.25,9.2,-8,-0.25,9.3],
// 3 4 -9.5 -0.25 9.9 -8.9 -0.25 9.1 -8.5 -0.25 9.2
  [3,4,-9.5,-0.25,9.9,-8.9,-0.25,9.1,-8.5,-0.25,9.2],
// 3 4 -9.5 -0.25 9.9 -9.3 -0.25 8.9 -8.9 -0.25 9.1
  [3,4,-9.5,-0.25,9.9,-9.3,-0.25,8.9,-8.9,-0.25,9.1],
// 3 4 -9.5 -0.25 9.9 -9.5 -0.25 8.7 -9.3 -0.25 8.9
  [3,4,-9.5,-0.25,9.9,-9.5,-0.25,8.7,-9.3,-0.25,8.9],
// 3 4 -5.4 -0.25 9.9 -6.9 -0.25 9.3 -6.4 -0.25 9.2
  [3,4,-5.4,-0.25,9.9,-6.9,-0.25,9.3,-6.4,-0.25,9.2],
// 3 4 -5.4 -0.25 9.9 -6.4 -0.25 9.2 -6 -0.25 9.1
  [3,4,-5.4,-0.25,9.9,-6.4,-0.25,9.2,-6,-0.25,9.1],
// 3 4 -5.4 -0.25 9.9 -6 -0.25 9.1 -5.6 -0.25 8.9
  [3,4,-5.4,-0.25,9.9,-6,-0.25,9.1,-5.6,-0.25,8.9],
// 3 4 -5.4 -0.25 9.9 -5.6 -0.25 8.9 -5.4 -0.25 8.7
  [3,4,-5.4,-0.25,9.9,-5.6,-0.25,8.9,-5.4,-0.25,8.7],
// 4 15 -7.4 -0.25 7 -4.6 -0.25 7.6 -10.3 -0.25 7.6 -7.5 -0.25 7
  [4,15,-7.4,-0.25,7,-4.6,-0.25,7.6,-10.3,-0.25,7.6,-7.5,-0.25,7],
// 3 15 -10.3 -0.25 7.6 -7.8 -0.25 6.9 -7.5 -0.25 7
  [3,15,-10.3,-0.25,7.6,-7.8,-0.25,6.9,-7.5,-0.25,7],
// 4 15 -7.5 -0.25 -7 -7.8 -0.25 -6.9 -10.4 -0.25 -7.2 -10.3 -0.25 -7.6
  [4,15,-7.5,-0.25,-7,-7.8,-0.25,-6.9,-10.4,-0.25,-7.2,-10.3,-0.25,-7.6],
// 4 15 -7.4 -0.25 -7 -7.5 -0.25 -7 -10.3 -0.25 -7.6 -4.6 -0.25 -7.6
  [4,15,-7.4,-0.25,-7,-7.5,-0.25,-7,-10.3,-0.25,-7.6,-4.6,-0.25,-7.6],
// 3 15 -7.1 -0.25 -6.9 -7.4 -0.25 -7 -4.6 -0.25 -7.6
  [3,15,-7.1,-0.25,-6.9,-7.4,-0.25,-7,-4.6,-0.25,-7.6],
// 3 4 -13 -0.25 13 -10.8 -0.25 10 -9.6 -0.25 10
  [3,4,-13,-0.25,13,-10.8,-0.25,10,-9.6,-0.25,10],
// 3 4 -13 -0.25 13 -10.9 -0.25 9.9 -10.8 -0.25 10
  [3,4,-13,-0.25,13,-10.9,-0.25,9.9,-10.8,-0.25,10],
// 3 4 -13 -0.25 13 -10.9 -0.25 8.6 -10.9 -0.25 9.9
  [3,4,-13,-0.25,13,-10.9,-0.25,8.6,-10.9,-0.25,9.9],
// 3 4 -9.7 -0.25 8.5 -10.8 -0.25 8.5 -10 -0.25 8.2
  [3,4,-9.7,-0.25,8.5,-10.8,-0.25,8.5,-10,-0.25,8.2],
// 3 4 -10.8 -0.25 8.5 -10.2 -0.25 7.9 -10 -0.25 8.2
  [3,4,-10.8,-0.25,8.5,-10.2,-0.25,7.9,-10,-0.25,8.2],
// 3 4 -10.8 -0.25 8.5 -10.3 -0.25 7.6 -10.2 -0.25 7.9
  [3,4,-10.8,-0.25,8.5,-10.3,-0.25,7.6,-10.2,-0.25,7.9],
// 4 4 -10.4 -0.25 7.2 -10.3 -0.25 7.6 -10.8 -0.25 8.5 -10.9 -0.25 8.6
  [4,4,-10.4,-0.25,7.2,-10.3,-0.25,7.6,-10.8,-0.25,8.5,-10.9,-0.25,8.6],
// 4 4 -10.4 -0.25 7.2 -10.9 -0.25 8.6 -13 -0.25 13 -10.4 -0.25 -7.2
  [4,4,-10.4,-0.25,7.2,-10.9,-0.25,8.6,-13,-0.25,13,-10.4,-0.25,-7.2],
// 3 4 -13 -0.25 13 -13 -0.25 -13 -10.4 -0.25 -7.2
  [3,4,-13,-0.25,13,-13,-0.25,-13,-10.4,-0.25,-7.2],
// 3 4 -10.4 -0.25 -7.2 -13 -0.25 -13 -10.3 -0.25 -7.6
  [3,4,-10.4,-0.25,-7.2,-13,-0.25,-13,-10.3,-0.25,-7.6],
// 3 4 -10.3 -0.25 -7.6 -13 -0.25 -13 -10.2 -0.25 -7.9
  [3,4,-10.3,-0.25,-7.6,-13,-0.25,-13,-10.2,-0.25,-7.9],
// 3 4 -10.2 -0.25 -7.9 -13 -0.25 -13 -10 -0.25 -8.2
  [3,4,-10.2,-0.25,-7.9,-13,-0.25,-13,-10,-0.25,-8.2],
// 3 4 -10 -0.25 -8.2 -13 -0.25 -13 -9.7 -0.25 -8.6
  [3,4,-10,-0.25,-8.2,-13,-0.25,-13,-9.7,-0.25,-8.6],
// 3 4 -9.7 -0.25 -8.6 -13 -0.25 -13 -9.3 -0.25 -8.9
  [3,4,-9.7,-0.25,-8.6,-13,-0.25,-13,-9.3,-0.25,-8.9],
// 3 4 -9.3 -0.25 -8.9 -13 -0.25 -13 -8.9 -0.25 -9.1
  [3,4,-9.3,-0.25,-8.9,-13,-0.25,-13,-8.9,-0.25,-9.1],
// 3 4 -8.9 -0.25 -9.1 -13 -0.25 -13 -8.5 -0.25 -9.2
  [3,4,-8.9,-0.25,-9.1,-13,-0.25,-13,-8.5,-0.25,-9.2],
// 3 4 -8.5 -0.25 -9.2 -13 -0.25 -13 -8 -0.25 -9.3
  [3,4,-8.5,-0.25,-9.2,-13,-0.25,-13,-8,-0.25,-9.3],
// 3 4 -6.9 -0.25 -9.3 -8 -0.25 -9.3 -13 -0.25 -13
  [3,4,-6.9,-0.25,-9.3,-8,-0.25,-9.3,-13,-0.25,-13],
// 4 4 -6.9 -0.25 -9.3 -13 -0.25 -13 -3 -0.25 -9.3 -6.4 -0.25 -9.2
  [4,4,-6.9,-0.25,-9.3,-13,-0.25,-13,-3,-0.25,-9.3,-6.4,-0.25,-9.2],
// 3 4 -6 -0.25 -9.1 -6.4 -0.25 -9.2 -3 -0.25 -9.3
  [3,4,-6,-0.25,-9.1,-6.4,-0.25,-9.2,-3,-0.25,-9.3],
// 3 4 -5.6 -0.25 -8.9 -6 -0.25 -9.1 -3 -0.25 -9.3
  [3,4,-5.6,-0.25,-8.9,-6,-0.25,-9.1,-3,-0.25,-9.3],
// 3 4 -5.2 -0.25 -8.6 -5.6 -0.25 -8.9 -3 -0.25 -9.3
  [3,4,-5.2,-0.25,-8.6,-5.6,-0.25,-8.9,-3,-0.25,-9.3],
// 3 4 -4.9 -0.25 -8.2 -5.2 -0.25 -8.6 -3 -0.25 -9.3
  [3,4,-4.9,-0.25,-8.2,-5.2,-0.25,-8.6,-3,-0.25,-9.3],
// 3 4 -4.7 -0.25 -7.9 -4.9 -0.25 -8.2 -3 -0.25 -9.3
  [3,4,-4.7,-0.25,-7.9,-4.9,-0.25,-8.2,-3,-0.25,-9.3],
// 3 4 -4.6 -0.25 -7.6 -4.7 -0.25 -7.9 -3 -0.25 -9.3
  [3,4,-4.6,-0.25,-7.6,-4.7,-0.25,-7.9,-3,-0.25,-9.3],
// 3 4 -4.5 -0.25 -7.2 -4.6 -0.25 -7.6 -3 -0.25 -9.3
  [3,4,-4.5,-0.25,-7.2,-4.6,-0.25,-7.6,-3,-0.25,-9.3],
// 4 4 -4.5 -0.25 7.2 -4.5 -0.25 -7.2 -3 -0.25 -9.3 -4.1 -0.25 8.5
  [4,4,-4.5,-0.25,7.2,-4.5,-0.25,-7.2,-3,-0.25,-9.3,-4.1,-0.25,8.5],
// 3 4 -4.1 -0.25 8.5 -4.6 -0.25 7.6 -4.5 -0.25 7.2
  [3,4,-4.1,-0.25,8.5,-4.6,-0.25,7.6,-4.5,-0.25,7.2],
// 3 4 -4.1 -0.25 8.5 -4.7 -0.25 7.9 -4.6 -0.25 7.6
  [3,4,-4.1,-0.25,8.5,-4.7,-0.25,7.9,-4.6,-0.25,7.6],
// 3 4 -4.1 -0.25 8.5 -4.9 -0.25 8.2 -4.7 -0.25 7.9
  [3,4,-4.1,-0.25,8.5,-4.9,-0.25,8.2,-4.7,-0.25,7.9],
// 3 4 -4.1 -0.25 8.5 -5.2 -0.25 8.5 -4.9 -0.25 8.2
  [3,4,-4.1,-0.25,8.5,-5.2,-0.25,8.5,-4.9,-0.25,8.2],
// 4 4 -4 -0.25 8.6 -4.1 -0.25 8.5 -3 -0.25 -9.3 -3 -0.25 9.3
  [4,4,-4,-0.25,8.6,-4.1,-0.25,8.5,-3,-0.25,-9.3,-3,-0.25,9.3],
// 3 4 -4 -0.25 9.9 -4 -0.25 8.6 -3 -0.25 9.3
  [3,4,-4,-0.25,9.9,-4,-0.25,8.6,-3,-0.25,9.3],
// 4 4 -4 -0.25 9.9 -3 -0.25 9.3 1.5 -0.25 9.3 -4.1 -0.25 10
  [4,4,-4,-0.25,9.9,-3,-0.25,9.3,1.5,-0.25,9.3,-4.1,-0.25,10],
// 4 4 1.2 -0.25 -9.3 -3 -0.25 -9.3 -13 -0.25 -13 13 -0.25 -13
  [4,4,1.2,-0.25,-9.3,-3,-0.25,-9.3,-13,-0.25,-13,13,-0.25,-13],
// 4 4 1.2 -0.25 -9.3 13 -0.25 -13 4.3 -0.25 -9.3 1.8 -0.25 -9.2
  [4,4,1.2,-0.25,-9.3,13,-0.25,-13,4.3,-0.25,-9.3,1.8,-0.25,-9.2],
// 3 4 8.5 -0.25 -9.3 4.3 -0.25 -9.3 13 -0.25 -13
  [3,4,8.5,-0.25,-9.3,4.3,-0.25,-9.3,13,-0.25,-13],
// 3 4 9.1 -0.25 -9.2 8.5 -0.25 -9.3 13 -0.25 -13
  [3,4,9.1,-0.25,-9.2,8.5,-0.25,-9.3,13,-0.25,-13],
// 3 4 9.5 -0.25 -9 9.1 -0.25 -9.2 13 -0.25 -13
  [3,4,9.5,-0.25,-9,9.1,-0.25,-9.2,13,-0.25,-13],
// 3 4 9.8 -0.25 -8.8 9.5 -0.25 -9 13 -0.25 -13
  [3,4,9.8,-0.25,-8.8,9.5,-0.25,-9,13,-0.25,-13],
// 3 4 10 -0.25 -8.5 9.8 -0.25 -8.8 13 -0.25 -13
  [3,4,10,-0.25,-8.5,9.8,-0.25,-8.8,13,-0.25,-13],
// 3 4 10.2 -0.25 -8.1 10 -0.25 -8.5 13 -0.25 -13
  [3,4,10.2,-0.25,-8.1,10,-0.25,-8.5,13,-0.25,-13],
// 3 4 10.3 -0.25 -7.5 10.2 -0.25 -8.1 13 -0.25 -13
  [3,4,10.3,-0.25,-7.5,10.2,-0.25,-8.1,13,-0.25,-13],
// 3 4 10.3 -0.25 -0.8 10.3 -0.25 -7.5 13 -0.25 -13
  [3,4,10.3,-0.25,-0.8,10.3,-0.25,-7.5,13,-0.25,-13],
// 4 4 10.3 -0.25 -0.8 13 -0.25 -13 10.3 -0.25 2 10.2 -0.25 -0.2
  [4,4,10.3,-0.25,-0.8,13,-0.25,-13,10.3,-0.25,2,10.2,-0.25,-0.2],
// 4 4 10.2 -0.25 -0.2 10.3 -0.25 2 10.2 -0.25 1.4 10.1 -0.25 0.1
  [4,4,10.2,-0.25,-0.2,10.3,-0.25,2,10.2,-0.25,1.4,10.1,-0.25,0.1],
// 4 4 10.1 -0.25 0.1 10.2 -0.25 1.4 10.1 -0.25 1.1 9.9 -0.25 0.4
  [4,4,10.1,-0.25,0.1,10.2,-0.25,1.4,10.1,-0.25,1.1,9.9,-0.25,0.4],
// 3 4 10.1 -0.25 1.1 9.9 -0.25 0.8 9.9 -0.25 0.4
  [3,4,10.1,-0.25,1.1,9.9,-0.25,0.8,9.9,-0.25,0.4],
// 3 4 9.9 -0.25 0.8 9.6 -0.25 0.6 9.9 -0.25 0.4
  [3,4,9.9,-0.25,0.8,9.6,-0.25,0.6,9.9,-0.25,0.4],
// 4 4 10.3 -0.25 2 13 -0.25 -13 13 -0.25 13 10.3 -0.25 7.8
  [4,4,10.3,-0.25,2,13,-0.25,-13,13,-0.25,13,10.3,-0.25,7.8],
// 3 4 13 -0.25 13 10.2 -0.25 8.2 10.3 -0.25 7.8
  [3,4,13,-0.25,13,10.2,-0.25,8.2,10.3,-0.25,7.8],
// 3 4 13 -0.25 13 10.1 -0.25 8.5 10.2 -0.25 8.2
  [3,4,13,-0.25,13,10.1,-0.25,8.5,10.2,-0.25,8.2],
// 3 4 13 -0.25 13 9.8 -0.25 8.9 10.1 -0.25 8.5
  [3,4,13,-0.25,13,9.8,-0.25,8.9,10.1,-0.25,8.5],
// 3 4 13 -0.25 13 9.5 -0.25 9.1 9.8 -0.25 8.9
  [3,4,13,-0.25,13,9.5,-0.25,9.1,9.8,-0.25,8.9],
// 3 4 13 -0.25 13 9.2 -0.25 9.2 9.5 -0.25 9.1
  [3,4,13,-0.25,13,9.2,-0.25,9.2,9.5,-0.25,9.1],
// 3 4 13 -0.25 13 8.8 -0.25 9.3 9.2 -0.25 9.2
  [3,4,13,-0.25,13,8.8,-0.25,9.3,9.2,-0.25,9.2],
// 3 4 13 -0.25 13 4.3 -0.25 9.3 8.8 -0.25 9.3
  [3,4,13,-0.25,13,4.3,-0.25,9.3,8.8,-0.25,9.3],
// 4 4 4.3 -0.25 9.3 13 -0.25 13 1.5 -0.25 9.3 1.9 -0.25 9.2
  [4,4,4.3,-0.25,9.3,13,-0.25,13,1.5,-0.25,9.3,1.9,-0.25,9.2],
// 3 4 4.3 -0.25 9.3 1.9 -0.25 9.2 2.2 -0.25 9.1
  [3,4,4.3,-0.25,9.3,1.9,-0.25,9.2,2.2,-0.25,9.1],
// 3 4 4.3 -0.25 9.3 2.2 -0.25 9.1 2.5 -0.25 8.9
  [3,4,4.3,-0.25,9.3,2.2,-0.25,9.1,2.5,-0.25,8.9],
// 3 4 4.3 -0.25 9.3 2.5 -0.25 8.9 2.8 -0.25 8.5
  [3,4,4.3,-0.25,9.3,2.5,-0.25,8.9,2.8,-0.25,8.5],
// 3 4 4.3 -0.25 9.3 2.8 -0.25 8.5 2.9 -0.25 8.2
  [3,4,4.3,-0.25,9.3,2.8,-0.25,8.5,2.9,-0.25,8.2],
// 3 4 4.3 -0.25 9.3 2.9 -0.25 8.2 3 -0.25 7.8
  [3,4,4.3,-0.25,9.3,2.9,-0.25,8.2,3,-0.25,7.8],
// 3 4 4.3 -0.25 9.3 3 -0.25 7.8 3 -0.25 2
  [3,4,4.3,-0.25,9.3,3,-0.25,7.8,3,-0.25,2],
// 4 4 3 -0.25 -0.8 4.3 -0.25 9.3 3 -0.25 2 2.9 -0.25 1.4
  [4,4,3,-0.25,-0.8,4.3,-0.25,9.3,3,-0.25,2,2.9,-0.25,1.4],
// 4 4 2.9 -0.25 -0.2 3 -0.25 -0.8 2.9 -0.25 1.4 2.8 -0.25 1.1
  [4,4,2.9,-0.25,-0.2,3,-0.25,-0.8,2.9,-0.25,1.4,2.8,-0.25,1.1],
// 4 4 2.8 -0.25 0.1 2.9 -0.25 -0.2 2.8 -0.25 1.1 2.6 -0.25 0.8
  [4,4,2.8,-0.25,0.1,2.9,-0.25,-0.2,2.8,-0.25,1.1,2.6,-0.25,0.8],
// 3 4 2.6 -0.25 0.8 2.6 -0.25 0.4 2.8 -0.25 0.1
  [3,4,2.6,-0.25,0.8,2.6,-0.25,0.4,2.8,-0.25,0.1],
// 3 4 2.6 -0.25 0.8 2.3 -0.25 0.6 2.6 -0.25 0.4
  [3,4,2.6,-0.25,0.8,2.3,-0.25,0.6,2.6,-0.25,0.4],
// 4 4 4.3 -0.25 -9.3 4.3 -0.25 9.3 3 -0.25 -0.8 3 -0.25 -7.5
  [4,4,4.3,-0.25,-9.3,4.3,-0.25,9.3,3,-0.25,-0.8,3,-0.25,-7.5],
// 3 4 3 -0.25 -7.5 2.9 -0.25 -8.1 4.3 -0.25 -9.3
  [3,4,3,-0.25,-7.5,2.9,-0.25,-8.1,4.3,-0.25,-9.3],
// 3 4 2.9 -0.25 -8.1 2.7 -0.25 -8.5 4.3 -0.25 -9.3
  [3,4,2.9,-0.25,-8.1,2.7,-0.25,-8.5,4.3,-0.25,-9.3],
// 3 4 2.7 -0.25 -8.5 2.5 -0.25 -8.8 4.3 -0.25 -9.3
  [3,4,2.7,-0.25,-8.5,2.5,-0.25,-8.8,4.3,-0.25,-9.3],
// 3 4 2.5 -0.25 -8.8 2.2 -0.25 -9 4.3 -0.25 -9.3
  [3,4,2.5,-0.25,-8.8,2.2,-0.25,-9,4.3,-0.25,-9.3],
// 3 4 2.2 -0.25 -9 1.8 -0.25 -9.2 4.3 -0.25 -9.3
  [3,4,2.2,-0.25,-9,1.8,-0.25,-9.2,4.3,-0.25,-9.3],
];
module ldraw_lib__004757d(step=0, col=false, unit=2/5, alt=false, line=0.2, solid=!$preview)
    makepoly(ldraw_lib__004757d(), step=step, col=col, unit=unit, alt=alt, line=line, solid=solid);
ldraw_lib__004757d(line=0.2);
